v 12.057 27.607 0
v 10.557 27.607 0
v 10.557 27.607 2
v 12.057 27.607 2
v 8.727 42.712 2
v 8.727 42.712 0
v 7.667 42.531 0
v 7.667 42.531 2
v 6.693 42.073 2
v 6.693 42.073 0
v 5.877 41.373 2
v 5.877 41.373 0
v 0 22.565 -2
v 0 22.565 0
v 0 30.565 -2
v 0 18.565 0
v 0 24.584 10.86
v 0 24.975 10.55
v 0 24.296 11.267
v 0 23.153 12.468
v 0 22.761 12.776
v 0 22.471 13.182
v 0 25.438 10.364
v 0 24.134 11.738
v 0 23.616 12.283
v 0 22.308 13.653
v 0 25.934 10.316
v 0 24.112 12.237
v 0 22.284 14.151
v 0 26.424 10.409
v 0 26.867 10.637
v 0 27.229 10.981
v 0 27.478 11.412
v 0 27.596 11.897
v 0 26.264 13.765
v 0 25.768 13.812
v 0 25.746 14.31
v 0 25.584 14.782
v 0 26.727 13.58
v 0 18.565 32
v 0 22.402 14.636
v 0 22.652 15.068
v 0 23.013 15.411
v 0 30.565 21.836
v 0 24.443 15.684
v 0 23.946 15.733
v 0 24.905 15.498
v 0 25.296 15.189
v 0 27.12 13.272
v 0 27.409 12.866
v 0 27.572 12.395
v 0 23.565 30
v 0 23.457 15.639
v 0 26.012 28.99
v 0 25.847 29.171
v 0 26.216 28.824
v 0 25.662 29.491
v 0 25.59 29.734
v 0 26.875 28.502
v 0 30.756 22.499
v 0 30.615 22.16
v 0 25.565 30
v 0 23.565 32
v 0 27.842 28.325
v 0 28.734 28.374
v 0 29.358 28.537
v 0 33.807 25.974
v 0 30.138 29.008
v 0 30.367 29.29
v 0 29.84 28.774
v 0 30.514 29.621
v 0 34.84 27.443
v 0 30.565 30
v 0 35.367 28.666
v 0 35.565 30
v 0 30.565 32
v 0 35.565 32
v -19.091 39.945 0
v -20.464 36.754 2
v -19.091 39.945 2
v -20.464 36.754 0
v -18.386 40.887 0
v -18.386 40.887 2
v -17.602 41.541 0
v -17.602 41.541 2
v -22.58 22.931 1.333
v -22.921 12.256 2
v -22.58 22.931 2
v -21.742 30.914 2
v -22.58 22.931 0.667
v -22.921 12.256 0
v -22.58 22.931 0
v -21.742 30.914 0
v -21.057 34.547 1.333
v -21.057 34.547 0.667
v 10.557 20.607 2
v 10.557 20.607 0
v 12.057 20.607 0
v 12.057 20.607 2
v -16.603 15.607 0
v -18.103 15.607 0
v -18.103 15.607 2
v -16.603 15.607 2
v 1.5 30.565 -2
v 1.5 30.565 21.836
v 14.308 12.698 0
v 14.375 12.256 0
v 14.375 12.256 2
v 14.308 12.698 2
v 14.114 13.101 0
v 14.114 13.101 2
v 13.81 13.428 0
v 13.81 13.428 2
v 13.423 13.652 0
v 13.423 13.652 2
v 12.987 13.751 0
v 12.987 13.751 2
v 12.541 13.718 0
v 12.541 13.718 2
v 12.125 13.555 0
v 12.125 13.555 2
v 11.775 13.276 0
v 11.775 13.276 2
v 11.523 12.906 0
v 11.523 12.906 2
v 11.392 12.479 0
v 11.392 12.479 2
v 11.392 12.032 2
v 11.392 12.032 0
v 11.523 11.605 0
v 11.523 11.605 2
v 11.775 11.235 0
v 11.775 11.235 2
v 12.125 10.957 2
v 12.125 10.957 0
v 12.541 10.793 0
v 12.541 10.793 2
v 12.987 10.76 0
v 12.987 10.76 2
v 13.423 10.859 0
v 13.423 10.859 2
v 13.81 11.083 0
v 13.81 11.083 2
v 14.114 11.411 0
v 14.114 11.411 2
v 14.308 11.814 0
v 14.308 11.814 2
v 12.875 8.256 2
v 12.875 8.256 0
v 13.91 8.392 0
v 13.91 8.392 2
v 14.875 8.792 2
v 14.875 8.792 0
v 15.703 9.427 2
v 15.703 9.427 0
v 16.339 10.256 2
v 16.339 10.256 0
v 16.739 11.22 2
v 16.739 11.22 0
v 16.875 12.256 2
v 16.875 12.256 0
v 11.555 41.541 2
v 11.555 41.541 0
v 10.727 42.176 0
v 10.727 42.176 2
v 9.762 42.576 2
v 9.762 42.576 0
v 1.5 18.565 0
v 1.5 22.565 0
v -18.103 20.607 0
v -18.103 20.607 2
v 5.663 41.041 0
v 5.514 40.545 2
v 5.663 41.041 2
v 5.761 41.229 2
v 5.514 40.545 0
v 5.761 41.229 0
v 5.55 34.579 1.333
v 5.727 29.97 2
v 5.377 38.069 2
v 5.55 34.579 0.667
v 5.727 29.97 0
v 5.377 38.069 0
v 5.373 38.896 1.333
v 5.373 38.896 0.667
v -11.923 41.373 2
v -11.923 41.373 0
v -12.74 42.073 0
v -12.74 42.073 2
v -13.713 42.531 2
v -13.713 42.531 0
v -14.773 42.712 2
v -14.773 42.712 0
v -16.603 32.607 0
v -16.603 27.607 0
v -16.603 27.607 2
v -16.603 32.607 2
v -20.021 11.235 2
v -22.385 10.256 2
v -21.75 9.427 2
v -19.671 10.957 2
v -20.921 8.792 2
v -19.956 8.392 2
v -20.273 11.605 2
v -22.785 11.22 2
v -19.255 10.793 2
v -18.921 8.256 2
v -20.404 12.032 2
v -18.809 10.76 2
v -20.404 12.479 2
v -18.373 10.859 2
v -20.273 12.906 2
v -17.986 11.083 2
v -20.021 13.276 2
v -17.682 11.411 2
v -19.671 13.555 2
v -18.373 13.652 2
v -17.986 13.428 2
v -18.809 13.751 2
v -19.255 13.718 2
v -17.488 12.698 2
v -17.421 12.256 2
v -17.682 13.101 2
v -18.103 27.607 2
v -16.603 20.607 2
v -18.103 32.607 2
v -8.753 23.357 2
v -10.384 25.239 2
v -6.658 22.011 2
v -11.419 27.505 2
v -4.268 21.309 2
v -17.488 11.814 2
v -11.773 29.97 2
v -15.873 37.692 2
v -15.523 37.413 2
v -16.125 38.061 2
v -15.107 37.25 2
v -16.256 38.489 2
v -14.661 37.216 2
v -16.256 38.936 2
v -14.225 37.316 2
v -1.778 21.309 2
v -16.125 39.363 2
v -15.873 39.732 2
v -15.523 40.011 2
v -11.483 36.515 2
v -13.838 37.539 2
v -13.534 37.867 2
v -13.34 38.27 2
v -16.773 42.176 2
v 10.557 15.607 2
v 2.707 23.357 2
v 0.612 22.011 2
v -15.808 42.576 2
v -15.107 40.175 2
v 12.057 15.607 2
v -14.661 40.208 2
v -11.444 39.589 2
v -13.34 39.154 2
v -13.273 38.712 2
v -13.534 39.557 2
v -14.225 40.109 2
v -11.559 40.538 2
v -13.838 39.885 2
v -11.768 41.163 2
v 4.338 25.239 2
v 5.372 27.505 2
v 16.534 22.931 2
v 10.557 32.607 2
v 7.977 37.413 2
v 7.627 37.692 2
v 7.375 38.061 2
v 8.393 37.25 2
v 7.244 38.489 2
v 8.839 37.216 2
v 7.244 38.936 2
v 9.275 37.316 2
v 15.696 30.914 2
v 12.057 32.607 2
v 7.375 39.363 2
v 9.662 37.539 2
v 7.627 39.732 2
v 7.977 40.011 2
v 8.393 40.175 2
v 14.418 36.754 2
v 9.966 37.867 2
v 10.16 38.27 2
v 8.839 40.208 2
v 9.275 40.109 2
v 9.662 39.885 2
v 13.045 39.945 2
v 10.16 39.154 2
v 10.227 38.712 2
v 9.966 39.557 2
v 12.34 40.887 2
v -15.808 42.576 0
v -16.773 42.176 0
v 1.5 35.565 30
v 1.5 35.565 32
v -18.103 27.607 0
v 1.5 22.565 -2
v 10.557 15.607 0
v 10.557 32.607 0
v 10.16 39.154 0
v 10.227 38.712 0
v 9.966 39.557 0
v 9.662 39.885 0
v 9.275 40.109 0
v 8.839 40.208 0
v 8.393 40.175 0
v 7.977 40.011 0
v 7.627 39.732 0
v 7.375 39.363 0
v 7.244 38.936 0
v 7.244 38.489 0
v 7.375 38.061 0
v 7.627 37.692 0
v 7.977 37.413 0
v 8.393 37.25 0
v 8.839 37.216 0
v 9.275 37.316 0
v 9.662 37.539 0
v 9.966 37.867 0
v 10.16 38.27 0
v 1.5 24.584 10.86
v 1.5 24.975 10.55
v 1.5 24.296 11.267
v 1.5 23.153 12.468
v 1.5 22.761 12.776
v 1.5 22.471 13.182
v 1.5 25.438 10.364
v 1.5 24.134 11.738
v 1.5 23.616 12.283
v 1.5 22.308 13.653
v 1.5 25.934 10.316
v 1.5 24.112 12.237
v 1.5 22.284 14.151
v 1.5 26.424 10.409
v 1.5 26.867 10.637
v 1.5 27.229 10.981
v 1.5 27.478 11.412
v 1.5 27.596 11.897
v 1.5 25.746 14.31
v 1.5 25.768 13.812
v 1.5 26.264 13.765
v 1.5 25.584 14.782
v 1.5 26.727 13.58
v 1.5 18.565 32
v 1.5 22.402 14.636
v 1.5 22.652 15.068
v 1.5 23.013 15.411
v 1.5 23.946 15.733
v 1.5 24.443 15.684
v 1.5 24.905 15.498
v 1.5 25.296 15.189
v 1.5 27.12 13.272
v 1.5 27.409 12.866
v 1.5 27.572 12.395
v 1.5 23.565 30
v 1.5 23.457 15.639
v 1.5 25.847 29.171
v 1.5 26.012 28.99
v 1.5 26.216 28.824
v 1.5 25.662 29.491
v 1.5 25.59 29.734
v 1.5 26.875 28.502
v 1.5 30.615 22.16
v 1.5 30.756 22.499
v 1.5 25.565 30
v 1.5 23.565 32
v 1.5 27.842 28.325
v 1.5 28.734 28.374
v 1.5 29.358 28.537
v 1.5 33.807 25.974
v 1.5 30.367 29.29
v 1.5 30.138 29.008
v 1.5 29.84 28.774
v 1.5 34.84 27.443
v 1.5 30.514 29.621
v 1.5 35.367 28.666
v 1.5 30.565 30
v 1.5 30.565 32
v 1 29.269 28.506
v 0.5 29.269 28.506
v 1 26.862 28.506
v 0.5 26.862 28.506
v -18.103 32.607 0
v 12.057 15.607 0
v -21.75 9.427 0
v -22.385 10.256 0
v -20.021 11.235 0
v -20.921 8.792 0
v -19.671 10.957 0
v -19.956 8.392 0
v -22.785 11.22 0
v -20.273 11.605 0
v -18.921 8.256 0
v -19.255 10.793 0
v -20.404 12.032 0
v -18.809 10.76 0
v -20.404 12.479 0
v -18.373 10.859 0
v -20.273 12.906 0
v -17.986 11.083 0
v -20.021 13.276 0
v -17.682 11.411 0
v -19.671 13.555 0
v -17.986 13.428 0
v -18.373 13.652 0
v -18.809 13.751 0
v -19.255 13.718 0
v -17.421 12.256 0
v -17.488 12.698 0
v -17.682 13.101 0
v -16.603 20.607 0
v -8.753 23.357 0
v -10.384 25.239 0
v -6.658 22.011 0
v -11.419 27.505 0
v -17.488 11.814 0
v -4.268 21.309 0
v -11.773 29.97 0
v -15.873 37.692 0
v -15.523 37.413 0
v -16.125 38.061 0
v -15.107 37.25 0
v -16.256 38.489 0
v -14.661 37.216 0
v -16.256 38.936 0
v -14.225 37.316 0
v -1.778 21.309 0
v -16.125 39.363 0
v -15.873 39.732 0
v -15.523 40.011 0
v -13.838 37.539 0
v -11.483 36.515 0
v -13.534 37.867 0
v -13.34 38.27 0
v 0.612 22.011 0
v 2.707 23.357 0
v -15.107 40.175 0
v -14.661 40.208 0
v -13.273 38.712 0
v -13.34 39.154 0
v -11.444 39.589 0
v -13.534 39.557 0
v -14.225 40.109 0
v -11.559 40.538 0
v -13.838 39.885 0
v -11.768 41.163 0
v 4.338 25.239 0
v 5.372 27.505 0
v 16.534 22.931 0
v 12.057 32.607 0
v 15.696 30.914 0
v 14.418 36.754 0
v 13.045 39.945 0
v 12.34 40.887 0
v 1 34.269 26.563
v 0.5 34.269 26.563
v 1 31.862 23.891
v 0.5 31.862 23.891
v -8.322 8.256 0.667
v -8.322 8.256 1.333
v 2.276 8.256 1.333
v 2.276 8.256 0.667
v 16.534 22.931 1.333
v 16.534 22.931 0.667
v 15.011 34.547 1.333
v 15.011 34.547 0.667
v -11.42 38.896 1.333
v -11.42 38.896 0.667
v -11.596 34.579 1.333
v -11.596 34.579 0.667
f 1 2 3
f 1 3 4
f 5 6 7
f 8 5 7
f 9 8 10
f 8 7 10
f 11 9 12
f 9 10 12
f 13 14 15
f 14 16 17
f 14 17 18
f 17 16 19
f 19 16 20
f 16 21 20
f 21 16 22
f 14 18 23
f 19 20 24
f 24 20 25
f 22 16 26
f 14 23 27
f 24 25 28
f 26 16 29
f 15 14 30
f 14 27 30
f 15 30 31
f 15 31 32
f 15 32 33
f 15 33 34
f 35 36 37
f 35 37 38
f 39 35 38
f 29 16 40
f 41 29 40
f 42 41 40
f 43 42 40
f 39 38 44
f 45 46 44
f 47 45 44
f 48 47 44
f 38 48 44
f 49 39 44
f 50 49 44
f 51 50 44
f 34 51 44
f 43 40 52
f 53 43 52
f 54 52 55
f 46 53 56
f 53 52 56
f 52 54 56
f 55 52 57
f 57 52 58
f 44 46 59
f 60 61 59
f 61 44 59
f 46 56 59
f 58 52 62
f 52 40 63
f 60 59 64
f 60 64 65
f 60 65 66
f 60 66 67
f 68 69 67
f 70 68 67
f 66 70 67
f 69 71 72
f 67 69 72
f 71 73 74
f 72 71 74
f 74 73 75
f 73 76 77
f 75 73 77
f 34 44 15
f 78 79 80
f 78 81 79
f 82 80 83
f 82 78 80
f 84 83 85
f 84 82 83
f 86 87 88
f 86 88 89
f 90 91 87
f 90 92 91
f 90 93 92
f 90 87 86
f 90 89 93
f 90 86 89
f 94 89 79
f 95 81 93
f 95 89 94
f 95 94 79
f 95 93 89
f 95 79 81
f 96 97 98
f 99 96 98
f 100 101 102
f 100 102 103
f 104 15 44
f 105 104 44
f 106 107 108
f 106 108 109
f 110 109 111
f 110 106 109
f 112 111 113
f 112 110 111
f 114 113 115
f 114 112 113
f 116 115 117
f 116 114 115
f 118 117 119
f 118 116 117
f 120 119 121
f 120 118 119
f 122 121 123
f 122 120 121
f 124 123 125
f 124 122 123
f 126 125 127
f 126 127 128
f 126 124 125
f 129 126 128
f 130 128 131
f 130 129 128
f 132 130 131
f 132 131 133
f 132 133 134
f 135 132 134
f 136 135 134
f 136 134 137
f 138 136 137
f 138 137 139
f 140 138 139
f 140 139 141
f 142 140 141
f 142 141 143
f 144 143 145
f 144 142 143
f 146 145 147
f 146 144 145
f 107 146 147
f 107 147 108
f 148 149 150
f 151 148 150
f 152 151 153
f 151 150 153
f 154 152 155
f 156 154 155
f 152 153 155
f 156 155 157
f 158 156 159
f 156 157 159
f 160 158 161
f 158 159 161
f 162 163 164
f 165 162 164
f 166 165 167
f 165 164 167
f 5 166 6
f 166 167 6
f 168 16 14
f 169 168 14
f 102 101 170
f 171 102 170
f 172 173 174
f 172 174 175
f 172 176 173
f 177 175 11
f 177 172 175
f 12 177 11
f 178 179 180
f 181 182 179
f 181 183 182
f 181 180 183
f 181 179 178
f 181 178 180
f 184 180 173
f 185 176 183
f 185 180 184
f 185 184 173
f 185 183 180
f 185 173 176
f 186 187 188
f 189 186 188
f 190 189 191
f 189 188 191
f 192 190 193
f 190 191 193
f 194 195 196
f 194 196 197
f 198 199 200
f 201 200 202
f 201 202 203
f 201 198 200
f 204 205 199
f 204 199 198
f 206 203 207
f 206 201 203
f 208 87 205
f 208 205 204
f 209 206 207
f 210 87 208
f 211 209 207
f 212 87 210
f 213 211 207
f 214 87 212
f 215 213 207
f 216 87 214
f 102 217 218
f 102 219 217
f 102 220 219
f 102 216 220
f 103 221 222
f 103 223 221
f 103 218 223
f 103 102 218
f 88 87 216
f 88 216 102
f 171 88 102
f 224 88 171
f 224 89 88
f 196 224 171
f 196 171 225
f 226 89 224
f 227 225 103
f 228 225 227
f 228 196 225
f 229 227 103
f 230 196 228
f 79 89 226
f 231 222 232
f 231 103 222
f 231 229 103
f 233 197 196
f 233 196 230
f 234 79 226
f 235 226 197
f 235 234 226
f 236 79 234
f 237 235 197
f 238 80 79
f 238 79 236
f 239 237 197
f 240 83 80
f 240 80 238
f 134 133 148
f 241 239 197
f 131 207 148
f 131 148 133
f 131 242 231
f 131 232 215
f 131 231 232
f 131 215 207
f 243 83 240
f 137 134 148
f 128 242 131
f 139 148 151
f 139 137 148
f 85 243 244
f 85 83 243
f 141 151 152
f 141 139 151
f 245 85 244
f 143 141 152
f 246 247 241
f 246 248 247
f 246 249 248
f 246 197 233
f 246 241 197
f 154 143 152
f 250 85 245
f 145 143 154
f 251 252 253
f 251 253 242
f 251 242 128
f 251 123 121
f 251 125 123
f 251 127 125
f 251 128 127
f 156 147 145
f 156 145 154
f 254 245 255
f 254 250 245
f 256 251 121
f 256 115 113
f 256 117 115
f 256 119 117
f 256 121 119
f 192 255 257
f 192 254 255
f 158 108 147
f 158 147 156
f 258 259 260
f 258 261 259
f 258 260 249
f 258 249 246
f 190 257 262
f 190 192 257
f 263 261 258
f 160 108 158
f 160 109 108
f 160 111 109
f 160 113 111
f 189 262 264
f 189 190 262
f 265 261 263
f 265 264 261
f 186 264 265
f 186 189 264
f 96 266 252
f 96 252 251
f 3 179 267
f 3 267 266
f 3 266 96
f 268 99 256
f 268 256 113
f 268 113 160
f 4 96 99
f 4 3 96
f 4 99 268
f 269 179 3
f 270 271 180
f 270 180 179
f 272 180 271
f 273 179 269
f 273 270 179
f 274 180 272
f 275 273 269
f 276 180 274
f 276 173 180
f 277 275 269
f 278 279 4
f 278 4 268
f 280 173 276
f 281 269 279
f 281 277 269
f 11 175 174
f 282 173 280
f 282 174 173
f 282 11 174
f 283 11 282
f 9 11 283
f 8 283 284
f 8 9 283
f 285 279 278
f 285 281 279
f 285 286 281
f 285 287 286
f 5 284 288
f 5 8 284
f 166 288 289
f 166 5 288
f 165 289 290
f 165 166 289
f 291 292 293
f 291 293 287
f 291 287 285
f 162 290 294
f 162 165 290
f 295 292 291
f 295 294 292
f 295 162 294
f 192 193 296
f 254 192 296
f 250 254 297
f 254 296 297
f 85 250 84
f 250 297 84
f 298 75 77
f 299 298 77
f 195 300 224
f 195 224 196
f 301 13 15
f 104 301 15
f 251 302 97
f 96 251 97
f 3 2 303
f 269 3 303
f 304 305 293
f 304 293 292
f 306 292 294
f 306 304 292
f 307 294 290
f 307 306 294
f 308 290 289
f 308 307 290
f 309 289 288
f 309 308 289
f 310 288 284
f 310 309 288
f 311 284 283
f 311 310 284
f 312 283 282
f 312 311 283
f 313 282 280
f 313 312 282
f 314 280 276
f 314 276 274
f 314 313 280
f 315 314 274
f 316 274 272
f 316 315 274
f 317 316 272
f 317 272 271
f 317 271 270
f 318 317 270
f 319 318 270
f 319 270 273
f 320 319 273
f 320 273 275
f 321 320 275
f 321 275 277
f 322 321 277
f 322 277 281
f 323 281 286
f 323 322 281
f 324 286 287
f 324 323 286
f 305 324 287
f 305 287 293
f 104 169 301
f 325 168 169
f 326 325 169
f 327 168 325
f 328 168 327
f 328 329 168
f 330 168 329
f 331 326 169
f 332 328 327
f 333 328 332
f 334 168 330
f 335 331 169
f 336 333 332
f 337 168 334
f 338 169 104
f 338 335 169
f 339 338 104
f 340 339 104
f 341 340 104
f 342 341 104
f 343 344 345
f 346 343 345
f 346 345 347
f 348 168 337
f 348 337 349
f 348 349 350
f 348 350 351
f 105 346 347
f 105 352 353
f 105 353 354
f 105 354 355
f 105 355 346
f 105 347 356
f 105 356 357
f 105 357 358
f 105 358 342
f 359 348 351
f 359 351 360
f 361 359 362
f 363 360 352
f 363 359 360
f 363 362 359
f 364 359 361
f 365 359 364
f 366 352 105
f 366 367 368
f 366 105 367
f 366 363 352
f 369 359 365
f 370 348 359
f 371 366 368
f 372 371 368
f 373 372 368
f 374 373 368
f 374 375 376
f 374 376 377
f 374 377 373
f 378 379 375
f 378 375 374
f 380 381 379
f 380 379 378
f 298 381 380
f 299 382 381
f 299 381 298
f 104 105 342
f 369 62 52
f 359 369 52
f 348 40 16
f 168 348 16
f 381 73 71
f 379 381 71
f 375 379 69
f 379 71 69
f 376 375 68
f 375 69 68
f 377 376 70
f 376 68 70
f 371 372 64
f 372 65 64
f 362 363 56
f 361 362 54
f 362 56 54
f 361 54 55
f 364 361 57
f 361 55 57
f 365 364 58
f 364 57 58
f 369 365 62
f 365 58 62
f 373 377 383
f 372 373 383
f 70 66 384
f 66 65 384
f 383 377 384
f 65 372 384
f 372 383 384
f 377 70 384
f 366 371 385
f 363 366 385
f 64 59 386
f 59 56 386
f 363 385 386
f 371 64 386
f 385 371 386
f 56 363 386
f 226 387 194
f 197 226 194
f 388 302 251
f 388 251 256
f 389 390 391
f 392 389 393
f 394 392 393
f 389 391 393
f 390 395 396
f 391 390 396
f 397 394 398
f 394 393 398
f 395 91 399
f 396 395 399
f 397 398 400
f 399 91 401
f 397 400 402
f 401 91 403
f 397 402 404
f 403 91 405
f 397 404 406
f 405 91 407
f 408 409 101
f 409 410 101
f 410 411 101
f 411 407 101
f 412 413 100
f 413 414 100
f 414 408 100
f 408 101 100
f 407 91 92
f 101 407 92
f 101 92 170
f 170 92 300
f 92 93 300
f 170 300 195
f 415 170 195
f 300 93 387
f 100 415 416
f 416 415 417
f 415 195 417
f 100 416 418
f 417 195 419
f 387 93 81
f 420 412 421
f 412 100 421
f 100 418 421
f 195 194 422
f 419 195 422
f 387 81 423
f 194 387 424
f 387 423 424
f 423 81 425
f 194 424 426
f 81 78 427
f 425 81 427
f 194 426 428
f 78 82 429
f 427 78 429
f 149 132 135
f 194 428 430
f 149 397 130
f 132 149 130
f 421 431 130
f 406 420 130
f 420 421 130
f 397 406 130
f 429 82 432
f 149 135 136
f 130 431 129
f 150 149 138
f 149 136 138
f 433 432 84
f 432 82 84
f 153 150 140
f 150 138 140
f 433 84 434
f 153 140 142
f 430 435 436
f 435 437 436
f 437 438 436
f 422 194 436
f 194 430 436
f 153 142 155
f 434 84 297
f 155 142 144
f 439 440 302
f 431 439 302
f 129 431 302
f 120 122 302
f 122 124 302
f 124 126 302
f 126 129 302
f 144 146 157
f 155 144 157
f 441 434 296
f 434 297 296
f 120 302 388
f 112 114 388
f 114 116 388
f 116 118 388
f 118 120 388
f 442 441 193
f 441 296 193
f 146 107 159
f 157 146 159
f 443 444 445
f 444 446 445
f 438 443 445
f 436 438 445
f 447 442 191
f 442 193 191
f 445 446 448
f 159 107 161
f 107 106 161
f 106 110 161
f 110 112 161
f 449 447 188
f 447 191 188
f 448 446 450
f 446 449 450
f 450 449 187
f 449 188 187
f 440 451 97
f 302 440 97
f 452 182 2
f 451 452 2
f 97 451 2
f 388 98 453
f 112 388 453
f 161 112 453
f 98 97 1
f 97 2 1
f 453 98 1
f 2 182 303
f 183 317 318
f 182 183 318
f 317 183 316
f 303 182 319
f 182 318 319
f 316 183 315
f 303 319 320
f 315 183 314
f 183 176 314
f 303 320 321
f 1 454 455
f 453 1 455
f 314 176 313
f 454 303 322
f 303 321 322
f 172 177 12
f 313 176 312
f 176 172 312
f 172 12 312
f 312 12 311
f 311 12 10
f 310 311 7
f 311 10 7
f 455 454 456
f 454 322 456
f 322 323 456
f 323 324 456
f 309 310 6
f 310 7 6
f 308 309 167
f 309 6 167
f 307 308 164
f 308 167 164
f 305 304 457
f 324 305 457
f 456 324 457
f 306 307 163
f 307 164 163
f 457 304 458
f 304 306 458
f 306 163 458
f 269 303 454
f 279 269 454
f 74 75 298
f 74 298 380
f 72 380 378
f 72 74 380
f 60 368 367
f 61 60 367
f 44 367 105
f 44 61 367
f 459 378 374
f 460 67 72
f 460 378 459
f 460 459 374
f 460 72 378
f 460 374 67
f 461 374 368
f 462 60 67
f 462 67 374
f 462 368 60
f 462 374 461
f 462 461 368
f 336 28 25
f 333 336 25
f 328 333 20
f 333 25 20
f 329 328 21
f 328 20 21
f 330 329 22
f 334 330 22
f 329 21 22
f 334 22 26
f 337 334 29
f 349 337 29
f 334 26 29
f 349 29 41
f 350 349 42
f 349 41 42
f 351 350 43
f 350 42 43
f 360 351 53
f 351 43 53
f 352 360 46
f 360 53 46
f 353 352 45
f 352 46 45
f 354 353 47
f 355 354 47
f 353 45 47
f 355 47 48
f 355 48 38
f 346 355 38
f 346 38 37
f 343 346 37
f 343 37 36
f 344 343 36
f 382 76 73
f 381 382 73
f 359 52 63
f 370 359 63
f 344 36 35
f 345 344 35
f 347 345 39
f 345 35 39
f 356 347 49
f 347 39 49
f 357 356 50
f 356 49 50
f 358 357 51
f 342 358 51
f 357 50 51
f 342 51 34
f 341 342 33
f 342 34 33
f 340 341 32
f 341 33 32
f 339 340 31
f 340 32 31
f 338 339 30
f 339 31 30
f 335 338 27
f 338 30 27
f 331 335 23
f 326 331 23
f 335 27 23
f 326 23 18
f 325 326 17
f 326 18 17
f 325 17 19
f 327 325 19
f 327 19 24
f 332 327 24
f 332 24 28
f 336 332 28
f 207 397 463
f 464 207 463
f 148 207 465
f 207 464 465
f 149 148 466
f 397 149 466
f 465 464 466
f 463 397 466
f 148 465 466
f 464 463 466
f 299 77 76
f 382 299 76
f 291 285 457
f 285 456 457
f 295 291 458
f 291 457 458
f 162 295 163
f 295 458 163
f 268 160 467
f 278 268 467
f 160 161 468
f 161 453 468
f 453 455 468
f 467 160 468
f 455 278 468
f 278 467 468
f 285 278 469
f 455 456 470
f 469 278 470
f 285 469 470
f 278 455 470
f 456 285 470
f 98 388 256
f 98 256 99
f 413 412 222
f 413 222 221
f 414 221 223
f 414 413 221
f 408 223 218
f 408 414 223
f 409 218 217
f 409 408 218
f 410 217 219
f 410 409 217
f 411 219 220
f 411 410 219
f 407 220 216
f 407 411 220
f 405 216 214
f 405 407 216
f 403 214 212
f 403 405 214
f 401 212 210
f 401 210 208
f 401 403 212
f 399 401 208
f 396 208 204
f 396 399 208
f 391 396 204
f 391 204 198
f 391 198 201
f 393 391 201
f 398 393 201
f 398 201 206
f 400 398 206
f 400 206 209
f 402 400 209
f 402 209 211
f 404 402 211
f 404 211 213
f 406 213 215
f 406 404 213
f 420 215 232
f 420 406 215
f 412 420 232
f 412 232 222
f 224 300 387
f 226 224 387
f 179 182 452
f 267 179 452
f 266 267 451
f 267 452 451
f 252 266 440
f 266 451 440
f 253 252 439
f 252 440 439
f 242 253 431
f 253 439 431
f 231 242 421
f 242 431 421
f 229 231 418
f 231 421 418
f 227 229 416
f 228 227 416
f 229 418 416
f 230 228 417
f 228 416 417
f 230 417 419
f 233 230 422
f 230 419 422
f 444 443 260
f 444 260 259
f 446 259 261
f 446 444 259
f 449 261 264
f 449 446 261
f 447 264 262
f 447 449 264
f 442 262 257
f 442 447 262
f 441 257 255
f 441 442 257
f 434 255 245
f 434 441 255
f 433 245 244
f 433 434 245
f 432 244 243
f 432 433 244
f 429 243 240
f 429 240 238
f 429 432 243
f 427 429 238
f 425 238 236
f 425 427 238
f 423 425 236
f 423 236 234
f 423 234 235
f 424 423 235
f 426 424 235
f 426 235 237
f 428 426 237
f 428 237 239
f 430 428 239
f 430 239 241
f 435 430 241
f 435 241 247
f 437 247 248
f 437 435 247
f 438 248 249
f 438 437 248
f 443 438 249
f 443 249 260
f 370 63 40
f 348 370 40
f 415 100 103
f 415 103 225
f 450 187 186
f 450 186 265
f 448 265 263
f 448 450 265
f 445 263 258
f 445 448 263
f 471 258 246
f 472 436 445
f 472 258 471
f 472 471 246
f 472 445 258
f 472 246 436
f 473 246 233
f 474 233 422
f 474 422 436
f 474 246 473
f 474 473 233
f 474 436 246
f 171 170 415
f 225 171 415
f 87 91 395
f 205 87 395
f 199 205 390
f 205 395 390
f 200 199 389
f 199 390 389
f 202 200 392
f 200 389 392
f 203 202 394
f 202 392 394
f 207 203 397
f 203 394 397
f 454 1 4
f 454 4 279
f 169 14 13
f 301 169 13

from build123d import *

# Parameters (mm, degrees)
F1_DEPTH = 1.5
F3_R     = 1.5
F3_W     = 1.5
F3_H     = 5
F4_DEPTH = 2


with BuildPart() as f1:
    # F0 (on Right) → F1 (new body)
    with BuildSketch(Plane.YZ):
        with BuildLine():
            Line((30.565304, -2), (30.565304, 0))
            Line((30.565304, 0), (30.565304, 21.835811))
            add(Edge.make_bspline(
                [(35.565304, 30), (35.565304, 26.130686), (30.565304, 23.632735), (30.565304, 21.835811)],
                knots=[0, 0, 0, 0, 9.573608, 9.573608, 9.573608, 9.573608], degree=3))
            Line((35.565304, 30), (35.565304, 32))
            Line((35.565304, 32), (30.565304, 32))
            Line((30.565304, 32), (30.565304, 30))
            add(Edge.make_bspline(
                [(30.565304, 30), (30.565304, 27.759025), (25.565304, 27.759025), (25.565304, 30)],
                knots=[0, 0, 0, 0, 5, 5, 5, 5], degree=3))
            Line((25.565304, 30), (23.565304, 30))
            Line((23.565304, 30), (23.565304, 32))
            Line((23.565304, 32), (18.565304, 32))
            Line((18.565304, 32), (18.565304, 30))
            Line((18.565304, 30), (18.565304, 0))
            Line((18.565304, 0), (22.565304, 0))
            Line((22.565304, 0), (22.565304, -2))
            Line((22.565304, -2), (30.565304, -2))
        make_face()
        with BuildLine():
            ThreePointArc((25.767836, 13.811722), (27.060241, 10.796046), (24.112478, 12.23664))
            ThreePointArc((24.112478, 12.23664), (22.820074, 15.252316), (25.767836, 13.811722))
        make_face(mode=Mode.SUBTRACT)
    extrude(amount=F1_DEPTH)


with BuildPart() as f4:
    # F3 (on Top) → F4 (new body)
    with BuildSketch(Plane.XY):
        with BuildLine():
            ThreePointArc((-22.921162, 12.255645), (-21.749589, 9.427218), (-18.921162, 8.255645))
            add(Edge.make_bspline(
                [(-18.921162, 8.255645), (-8.322495, 8.255645), (2.276172, 8.255645), (12.874838, 8.255645)],
                knots=[0, 0, 0, 0, 31.796, 31.796, 31.796, 31.796], degree=3))
            ThreePointArc((12.874838, 8.255645), (15.703265, 9.427218), (16.874838, 12.255645))
            add(Edge.make_bspline(
                [(16.874838, 12.255645), (16.874838, 20.606666), (16.226838, 38.712218), (11.555265, 41.540645)],
                knots=[0, 0, 0, 0, 29.764225, 29.764225, 29.764225, 29.764225], degree=3))
            ThreePointArc((11.555265, 41.540645), (10.257572, 42.407736), (8.726838, 42.712218))
            ThreePointArc((8.726838, 42.712218), (7.164545, 42.334995), (5.876838, 41.373294))
            add(Edge.make_bspline(
                [(5.726838, 29.970085), (5.776838, 34.208695), (4.80626, 40.331621), (5.876838, 41.373294)],
                knots=[0, 0, 0, 0, 11.404195, 11.404195, 11.404195, 11.404195], degree=3))
            ThreePointArc((5.726838, 29.970085), (-3.023162, 21.220085), (-11.773162, 29.970085))
            add(Edge.make_bspline(
                [(-11.923162, 41.373294), (-10.852584, 40.331621), (-11.823162, 34.208695), (-11.773162, 29.970085)],
                knots=[0, 0, 0, 0, 11.404195, 11.404195, 11.404195, 11.404195], degree=3))
            ThreePointArc((-11.923162, 41.373294), (-13.210868, 42.334995), (-14.773162, 42.712218))
            ThreePointArc((-14.773162, 42.712218), (-16.303895, 42.407736), (-17.601589, 41.540645))
            add(Edge.make_bspline(
                [(-22.921162, 12.255645), (-22.921162, 20.606666), (-22.273162, 38.712218), (-17.601589, 41.540645)],
                knots=[0, 0, 0, 0, 29.764225, 29.764225, 29.764225, 29.764225], degree=3))
        make_face()
        with Locations((-18.921162, 12.255645)):
            Circle(F3_R, mode=Mode.SUBTRACT)
        with Locations((-17.353162, 18.106666)):
            Rectangle(F3_W, F3_H, mode=Mode.SUBTRACT)
        with Locations((12.874838, 12.255645)):
            Circle(F3_R, mode=Mode.SUBTRACT)
        with Locations((11.306838, 18.106666)):
            Rectangle(F3_W, F3_H, mode=Mode.SUBTRACT)
        with Locations((-17.353162, 30.106666)):
            Rectangle(F3_W, F3_H, mode=Mode.SUBTRACT)
        with Locations((-14.773162, 38.712218)):
            Circle(F3_R, mode=Mode.SUBTRACT)
        with Locations((11.306838, 30.106666)):
            Rectangle(F3_W, F3_H, mode=Mode.SUBTRACT)
        with Locations((8.726838, 38.712218)):
            Circle(F3_R, mode=Mode.SUBTRACT)
    extrude(amount=F4_DEPTH)


solid = Compound([f1.part, f4.part])
